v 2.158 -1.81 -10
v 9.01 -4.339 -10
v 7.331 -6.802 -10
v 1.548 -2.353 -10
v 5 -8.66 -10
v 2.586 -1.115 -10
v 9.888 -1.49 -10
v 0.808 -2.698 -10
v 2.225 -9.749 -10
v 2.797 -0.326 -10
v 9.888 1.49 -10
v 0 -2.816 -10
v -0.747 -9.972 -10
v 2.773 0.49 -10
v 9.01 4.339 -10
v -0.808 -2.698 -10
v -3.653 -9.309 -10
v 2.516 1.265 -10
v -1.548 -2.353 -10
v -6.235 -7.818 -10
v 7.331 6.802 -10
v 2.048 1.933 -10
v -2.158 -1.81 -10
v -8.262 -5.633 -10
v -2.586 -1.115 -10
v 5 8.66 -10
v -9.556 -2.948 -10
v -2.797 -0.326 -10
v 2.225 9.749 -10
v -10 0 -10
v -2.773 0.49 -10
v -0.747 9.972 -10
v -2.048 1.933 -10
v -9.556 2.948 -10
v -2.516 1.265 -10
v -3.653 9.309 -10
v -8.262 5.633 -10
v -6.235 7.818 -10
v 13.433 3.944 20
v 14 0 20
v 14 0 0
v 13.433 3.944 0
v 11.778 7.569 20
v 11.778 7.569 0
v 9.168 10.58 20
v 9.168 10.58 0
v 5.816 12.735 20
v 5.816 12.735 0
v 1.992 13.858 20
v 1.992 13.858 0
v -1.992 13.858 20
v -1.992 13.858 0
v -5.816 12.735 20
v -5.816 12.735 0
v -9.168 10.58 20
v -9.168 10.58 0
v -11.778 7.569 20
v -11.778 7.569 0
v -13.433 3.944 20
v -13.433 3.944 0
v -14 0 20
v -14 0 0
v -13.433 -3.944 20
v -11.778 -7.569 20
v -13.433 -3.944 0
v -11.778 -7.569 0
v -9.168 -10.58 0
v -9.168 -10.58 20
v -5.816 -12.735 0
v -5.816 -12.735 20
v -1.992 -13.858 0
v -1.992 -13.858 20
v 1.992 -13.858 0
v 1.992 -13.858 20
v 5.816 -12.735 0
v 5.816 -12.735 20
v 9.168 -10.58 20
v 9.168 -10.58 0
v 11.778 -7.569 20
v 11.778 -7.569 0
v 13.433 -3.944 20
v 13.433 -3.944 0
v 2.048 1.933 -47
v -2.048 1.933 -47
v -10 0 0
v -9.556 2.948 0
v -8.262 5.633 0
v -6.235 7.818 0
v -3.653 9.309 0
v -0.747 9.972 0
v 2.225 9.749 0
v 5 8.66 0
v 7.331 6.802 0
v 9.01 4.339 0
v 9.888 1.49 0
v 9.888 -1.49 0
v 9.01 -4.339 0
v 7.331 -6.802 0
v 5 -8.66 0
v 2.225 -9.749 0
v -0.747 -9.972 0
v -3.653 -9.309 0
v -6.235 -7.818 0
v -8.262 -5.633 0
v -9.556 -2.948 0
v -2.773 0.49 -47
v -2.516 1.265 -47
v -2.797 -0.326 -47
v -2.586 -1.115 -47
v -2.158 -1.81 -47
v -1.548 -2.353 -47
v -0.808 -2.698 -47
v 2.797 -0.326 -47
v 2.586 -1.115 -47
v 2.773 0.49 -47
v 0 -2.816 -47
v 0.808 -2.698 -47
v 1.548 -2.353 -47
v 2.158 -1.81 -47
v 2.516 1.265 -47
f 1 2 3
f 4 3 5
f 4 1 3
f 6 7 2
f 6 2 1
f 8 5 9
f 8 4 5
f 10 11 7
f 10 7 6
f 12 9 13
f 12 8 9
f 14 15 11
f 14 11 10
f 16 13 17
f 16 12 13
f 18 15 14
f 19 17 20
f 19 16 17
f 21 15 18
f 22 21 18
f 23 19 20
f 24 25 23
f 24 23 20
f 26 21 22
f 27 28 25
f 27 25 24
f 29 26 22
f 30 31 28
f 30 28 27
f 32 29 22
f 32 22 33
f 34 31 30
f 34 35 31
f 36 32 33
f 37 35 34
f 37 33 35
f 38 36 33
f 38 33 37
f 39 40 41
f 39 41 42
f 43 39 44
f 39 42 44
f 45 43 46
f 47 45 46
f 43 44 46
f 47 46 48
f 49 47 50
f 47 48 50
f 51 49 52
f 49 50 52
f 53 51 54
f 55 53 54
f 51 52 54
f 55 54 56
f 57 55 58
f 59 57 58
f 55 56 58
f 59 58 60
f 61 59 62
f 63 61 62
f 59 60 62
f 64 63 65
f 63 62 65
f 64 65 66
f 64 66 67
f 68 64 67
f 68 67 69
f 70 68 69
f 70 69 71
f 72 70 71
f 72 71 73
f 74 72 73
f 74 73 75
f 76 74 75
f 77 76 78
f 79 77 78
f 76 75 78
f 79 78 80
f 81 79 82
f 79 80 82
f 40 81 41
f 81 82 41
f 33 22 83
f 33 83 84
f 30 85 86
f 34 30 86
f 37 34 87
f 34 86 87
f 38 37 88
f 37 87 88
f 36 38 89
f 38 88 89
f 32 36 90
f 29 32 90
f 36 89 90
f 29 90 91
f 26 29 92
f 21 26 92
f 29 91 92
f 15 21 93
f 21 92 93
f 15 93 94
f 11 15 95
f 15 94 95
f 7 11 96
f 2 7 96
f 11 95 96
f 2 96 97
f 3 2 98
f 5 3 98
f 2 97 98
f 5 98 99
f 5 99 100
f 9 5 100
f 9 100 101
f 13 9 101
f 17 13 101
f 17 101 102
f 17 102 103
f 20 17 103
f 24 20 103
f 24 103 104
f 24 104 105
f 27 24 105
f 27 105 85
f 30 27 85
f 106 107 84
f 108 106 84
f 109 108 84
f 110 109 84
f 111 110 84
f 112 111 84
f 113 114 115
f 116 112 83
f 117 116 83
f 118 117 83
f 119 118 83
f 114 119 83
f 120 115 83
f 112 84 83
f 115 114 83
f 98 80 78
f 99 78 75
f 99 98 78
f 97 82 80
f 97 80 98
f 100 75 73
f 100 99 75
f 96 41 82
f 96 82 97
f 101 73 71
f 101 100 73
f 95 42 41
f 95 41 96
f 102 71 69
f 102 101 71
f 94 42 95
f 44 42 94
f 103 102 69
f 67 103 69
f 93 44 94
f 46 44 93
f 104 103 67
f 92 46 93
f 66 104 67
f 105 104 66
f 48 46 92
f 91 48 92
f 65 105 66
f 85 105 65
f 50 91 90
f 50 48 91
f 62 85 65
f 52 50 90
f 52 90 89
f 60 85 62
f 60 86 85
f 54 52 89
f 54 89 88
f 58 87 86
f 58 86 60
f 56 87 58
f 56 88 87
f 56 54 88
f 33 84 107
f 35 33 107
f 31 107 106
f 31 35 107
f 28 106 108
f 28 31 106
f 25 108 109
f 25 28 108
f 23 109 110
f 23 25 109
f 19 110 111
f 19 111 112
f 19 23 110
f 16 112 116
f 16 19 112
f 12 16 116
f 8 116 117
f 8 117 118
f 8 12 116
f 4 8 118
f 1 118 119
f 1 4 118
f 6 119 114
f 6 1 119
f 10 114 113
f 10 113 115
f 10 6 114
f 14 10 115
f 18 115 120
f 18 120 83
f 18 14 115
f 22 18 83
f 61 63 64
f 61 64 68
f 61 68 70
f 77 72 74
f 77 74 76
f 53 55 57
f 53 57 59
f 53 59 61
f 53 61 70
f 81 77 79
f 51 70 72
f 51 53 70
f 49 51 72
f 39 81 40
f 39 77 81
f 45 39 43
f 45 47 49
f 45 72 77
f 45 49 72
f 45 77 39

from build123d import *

# Parameters (mm, degrees)
ESQUISSE1_R             = 14
BOSS_EXTRU_1_DEPTH      = 20
BOSS_EXTRU_2_DEPTH      = 47
ESQUISSE3_R             = 18
BOSS_EXTRU_3_DEPTH      = 2
ESQUISSE4_R             = 10
BOSS_EXTRU_4_DEPTH      = 8
BOSS_EXTRU_5_START      = -2
BOSS_EXTRU_5_DEPTH      = 2
ENL_V_START             = -2
ESQUISSE6_R             = 10
ENL_V_MAT_EXTRU_1_DEPTH = 2


with BuildPart() as part:
    # Esquisse1 → Boss.-Extru.1 (new body)
    with BuildSketch(Plane.XY):
        Circle(ESQUISSE1_R)
    extrude(amount=BOSS_EXTRU_1_DEPTH)

    # Esquisse2 → Boss.-Extru.2 (add)
    with BuildSketch(Plane(origin=(0, 0, 0), x_dir=(-1, 0, 0), z_dir=(0, 0, -1))):
        with BuildLine():
            Line((-2.047747609, 1.933319394), (2.047747609, 1.933319394))
            ThreePointArc((2.047747609, 1.933319394), (0, -2.816202079), (-2.047747609, 1.933319394))
        make_face()
    extrude(amount=BOSS_EXTRU_2_DEPTH)

    # Esquisse3 → Boss.-Extru.3 (add)
    with BuildSketch(Plane(origin=(0, 0, 0), x_dir=(-1, 0, 0), z_dir=(0, 0, -1))):
        Circle(ESQUISSE3_R)
    extrude(amount=BOSS_EXTRU_3_DEPTH)

    # Esquisse4 → Boss.-Extru.4 (add)
    with BuildSketch(Plane(origin=(0, 0, -2), x_dir=(-1, 0, 0), z_dir=(0, 0, -1))):
        Circle(ESQUISSE4_R)
    extrude(amount=BOSS_EXTRU_4_DEPTH)

    # Esquisse5 → Boss.-Extru.5 (add)
    with BuildSketch(Plane(origin=(0, 0, -2), x_dir=(-1, 0, 0), z_dir=(0, 0, -1)).offset(BOSS_EXTRU_5_START)):
        with BuildLine():
            Line((50, 18), (0, 18))
            ThreePointArc((0, 18), (12.727922061, 12.727922061), (18, 0))
            ThreePointArc((18, 0), (12.727922061, -12.727922061), (0, -18))
            Line((0, -18), (50, -18))
            ThreePointArc((50, -18), (57.071067812, -15.071067812), (60, -8))
            Line((60, -8), (60, 8))
            ThreePointArc((60, 8), (57.071067812, 15.071067812), (50, 18))
        make_face()
    extrude(amount=BOSS_EXTRU_5_DEPTH)

    # Esquisse6 → Enlèv. mat.-Extru.1 (cut)
    with BuildSketch(Plane(origin=(0, 0, -2), x_dir=(-1, 0, 0), z_dir=(0, 0, -1)).offset(ENL_V_START)):
        Polygon((0, 18), (-22.504594186, 18), (-22.504594186, -18), (62.101973599, -18), (62.101973599, 18), align=None)
        Circle(ESQUISSE6_R, mode=Mode.SUBTRACT)
    extrude(amount=ENL_V_MAT_EXTRU_1_DEPTH, mode=Mode.SUBTRACT)


solid = part.part
